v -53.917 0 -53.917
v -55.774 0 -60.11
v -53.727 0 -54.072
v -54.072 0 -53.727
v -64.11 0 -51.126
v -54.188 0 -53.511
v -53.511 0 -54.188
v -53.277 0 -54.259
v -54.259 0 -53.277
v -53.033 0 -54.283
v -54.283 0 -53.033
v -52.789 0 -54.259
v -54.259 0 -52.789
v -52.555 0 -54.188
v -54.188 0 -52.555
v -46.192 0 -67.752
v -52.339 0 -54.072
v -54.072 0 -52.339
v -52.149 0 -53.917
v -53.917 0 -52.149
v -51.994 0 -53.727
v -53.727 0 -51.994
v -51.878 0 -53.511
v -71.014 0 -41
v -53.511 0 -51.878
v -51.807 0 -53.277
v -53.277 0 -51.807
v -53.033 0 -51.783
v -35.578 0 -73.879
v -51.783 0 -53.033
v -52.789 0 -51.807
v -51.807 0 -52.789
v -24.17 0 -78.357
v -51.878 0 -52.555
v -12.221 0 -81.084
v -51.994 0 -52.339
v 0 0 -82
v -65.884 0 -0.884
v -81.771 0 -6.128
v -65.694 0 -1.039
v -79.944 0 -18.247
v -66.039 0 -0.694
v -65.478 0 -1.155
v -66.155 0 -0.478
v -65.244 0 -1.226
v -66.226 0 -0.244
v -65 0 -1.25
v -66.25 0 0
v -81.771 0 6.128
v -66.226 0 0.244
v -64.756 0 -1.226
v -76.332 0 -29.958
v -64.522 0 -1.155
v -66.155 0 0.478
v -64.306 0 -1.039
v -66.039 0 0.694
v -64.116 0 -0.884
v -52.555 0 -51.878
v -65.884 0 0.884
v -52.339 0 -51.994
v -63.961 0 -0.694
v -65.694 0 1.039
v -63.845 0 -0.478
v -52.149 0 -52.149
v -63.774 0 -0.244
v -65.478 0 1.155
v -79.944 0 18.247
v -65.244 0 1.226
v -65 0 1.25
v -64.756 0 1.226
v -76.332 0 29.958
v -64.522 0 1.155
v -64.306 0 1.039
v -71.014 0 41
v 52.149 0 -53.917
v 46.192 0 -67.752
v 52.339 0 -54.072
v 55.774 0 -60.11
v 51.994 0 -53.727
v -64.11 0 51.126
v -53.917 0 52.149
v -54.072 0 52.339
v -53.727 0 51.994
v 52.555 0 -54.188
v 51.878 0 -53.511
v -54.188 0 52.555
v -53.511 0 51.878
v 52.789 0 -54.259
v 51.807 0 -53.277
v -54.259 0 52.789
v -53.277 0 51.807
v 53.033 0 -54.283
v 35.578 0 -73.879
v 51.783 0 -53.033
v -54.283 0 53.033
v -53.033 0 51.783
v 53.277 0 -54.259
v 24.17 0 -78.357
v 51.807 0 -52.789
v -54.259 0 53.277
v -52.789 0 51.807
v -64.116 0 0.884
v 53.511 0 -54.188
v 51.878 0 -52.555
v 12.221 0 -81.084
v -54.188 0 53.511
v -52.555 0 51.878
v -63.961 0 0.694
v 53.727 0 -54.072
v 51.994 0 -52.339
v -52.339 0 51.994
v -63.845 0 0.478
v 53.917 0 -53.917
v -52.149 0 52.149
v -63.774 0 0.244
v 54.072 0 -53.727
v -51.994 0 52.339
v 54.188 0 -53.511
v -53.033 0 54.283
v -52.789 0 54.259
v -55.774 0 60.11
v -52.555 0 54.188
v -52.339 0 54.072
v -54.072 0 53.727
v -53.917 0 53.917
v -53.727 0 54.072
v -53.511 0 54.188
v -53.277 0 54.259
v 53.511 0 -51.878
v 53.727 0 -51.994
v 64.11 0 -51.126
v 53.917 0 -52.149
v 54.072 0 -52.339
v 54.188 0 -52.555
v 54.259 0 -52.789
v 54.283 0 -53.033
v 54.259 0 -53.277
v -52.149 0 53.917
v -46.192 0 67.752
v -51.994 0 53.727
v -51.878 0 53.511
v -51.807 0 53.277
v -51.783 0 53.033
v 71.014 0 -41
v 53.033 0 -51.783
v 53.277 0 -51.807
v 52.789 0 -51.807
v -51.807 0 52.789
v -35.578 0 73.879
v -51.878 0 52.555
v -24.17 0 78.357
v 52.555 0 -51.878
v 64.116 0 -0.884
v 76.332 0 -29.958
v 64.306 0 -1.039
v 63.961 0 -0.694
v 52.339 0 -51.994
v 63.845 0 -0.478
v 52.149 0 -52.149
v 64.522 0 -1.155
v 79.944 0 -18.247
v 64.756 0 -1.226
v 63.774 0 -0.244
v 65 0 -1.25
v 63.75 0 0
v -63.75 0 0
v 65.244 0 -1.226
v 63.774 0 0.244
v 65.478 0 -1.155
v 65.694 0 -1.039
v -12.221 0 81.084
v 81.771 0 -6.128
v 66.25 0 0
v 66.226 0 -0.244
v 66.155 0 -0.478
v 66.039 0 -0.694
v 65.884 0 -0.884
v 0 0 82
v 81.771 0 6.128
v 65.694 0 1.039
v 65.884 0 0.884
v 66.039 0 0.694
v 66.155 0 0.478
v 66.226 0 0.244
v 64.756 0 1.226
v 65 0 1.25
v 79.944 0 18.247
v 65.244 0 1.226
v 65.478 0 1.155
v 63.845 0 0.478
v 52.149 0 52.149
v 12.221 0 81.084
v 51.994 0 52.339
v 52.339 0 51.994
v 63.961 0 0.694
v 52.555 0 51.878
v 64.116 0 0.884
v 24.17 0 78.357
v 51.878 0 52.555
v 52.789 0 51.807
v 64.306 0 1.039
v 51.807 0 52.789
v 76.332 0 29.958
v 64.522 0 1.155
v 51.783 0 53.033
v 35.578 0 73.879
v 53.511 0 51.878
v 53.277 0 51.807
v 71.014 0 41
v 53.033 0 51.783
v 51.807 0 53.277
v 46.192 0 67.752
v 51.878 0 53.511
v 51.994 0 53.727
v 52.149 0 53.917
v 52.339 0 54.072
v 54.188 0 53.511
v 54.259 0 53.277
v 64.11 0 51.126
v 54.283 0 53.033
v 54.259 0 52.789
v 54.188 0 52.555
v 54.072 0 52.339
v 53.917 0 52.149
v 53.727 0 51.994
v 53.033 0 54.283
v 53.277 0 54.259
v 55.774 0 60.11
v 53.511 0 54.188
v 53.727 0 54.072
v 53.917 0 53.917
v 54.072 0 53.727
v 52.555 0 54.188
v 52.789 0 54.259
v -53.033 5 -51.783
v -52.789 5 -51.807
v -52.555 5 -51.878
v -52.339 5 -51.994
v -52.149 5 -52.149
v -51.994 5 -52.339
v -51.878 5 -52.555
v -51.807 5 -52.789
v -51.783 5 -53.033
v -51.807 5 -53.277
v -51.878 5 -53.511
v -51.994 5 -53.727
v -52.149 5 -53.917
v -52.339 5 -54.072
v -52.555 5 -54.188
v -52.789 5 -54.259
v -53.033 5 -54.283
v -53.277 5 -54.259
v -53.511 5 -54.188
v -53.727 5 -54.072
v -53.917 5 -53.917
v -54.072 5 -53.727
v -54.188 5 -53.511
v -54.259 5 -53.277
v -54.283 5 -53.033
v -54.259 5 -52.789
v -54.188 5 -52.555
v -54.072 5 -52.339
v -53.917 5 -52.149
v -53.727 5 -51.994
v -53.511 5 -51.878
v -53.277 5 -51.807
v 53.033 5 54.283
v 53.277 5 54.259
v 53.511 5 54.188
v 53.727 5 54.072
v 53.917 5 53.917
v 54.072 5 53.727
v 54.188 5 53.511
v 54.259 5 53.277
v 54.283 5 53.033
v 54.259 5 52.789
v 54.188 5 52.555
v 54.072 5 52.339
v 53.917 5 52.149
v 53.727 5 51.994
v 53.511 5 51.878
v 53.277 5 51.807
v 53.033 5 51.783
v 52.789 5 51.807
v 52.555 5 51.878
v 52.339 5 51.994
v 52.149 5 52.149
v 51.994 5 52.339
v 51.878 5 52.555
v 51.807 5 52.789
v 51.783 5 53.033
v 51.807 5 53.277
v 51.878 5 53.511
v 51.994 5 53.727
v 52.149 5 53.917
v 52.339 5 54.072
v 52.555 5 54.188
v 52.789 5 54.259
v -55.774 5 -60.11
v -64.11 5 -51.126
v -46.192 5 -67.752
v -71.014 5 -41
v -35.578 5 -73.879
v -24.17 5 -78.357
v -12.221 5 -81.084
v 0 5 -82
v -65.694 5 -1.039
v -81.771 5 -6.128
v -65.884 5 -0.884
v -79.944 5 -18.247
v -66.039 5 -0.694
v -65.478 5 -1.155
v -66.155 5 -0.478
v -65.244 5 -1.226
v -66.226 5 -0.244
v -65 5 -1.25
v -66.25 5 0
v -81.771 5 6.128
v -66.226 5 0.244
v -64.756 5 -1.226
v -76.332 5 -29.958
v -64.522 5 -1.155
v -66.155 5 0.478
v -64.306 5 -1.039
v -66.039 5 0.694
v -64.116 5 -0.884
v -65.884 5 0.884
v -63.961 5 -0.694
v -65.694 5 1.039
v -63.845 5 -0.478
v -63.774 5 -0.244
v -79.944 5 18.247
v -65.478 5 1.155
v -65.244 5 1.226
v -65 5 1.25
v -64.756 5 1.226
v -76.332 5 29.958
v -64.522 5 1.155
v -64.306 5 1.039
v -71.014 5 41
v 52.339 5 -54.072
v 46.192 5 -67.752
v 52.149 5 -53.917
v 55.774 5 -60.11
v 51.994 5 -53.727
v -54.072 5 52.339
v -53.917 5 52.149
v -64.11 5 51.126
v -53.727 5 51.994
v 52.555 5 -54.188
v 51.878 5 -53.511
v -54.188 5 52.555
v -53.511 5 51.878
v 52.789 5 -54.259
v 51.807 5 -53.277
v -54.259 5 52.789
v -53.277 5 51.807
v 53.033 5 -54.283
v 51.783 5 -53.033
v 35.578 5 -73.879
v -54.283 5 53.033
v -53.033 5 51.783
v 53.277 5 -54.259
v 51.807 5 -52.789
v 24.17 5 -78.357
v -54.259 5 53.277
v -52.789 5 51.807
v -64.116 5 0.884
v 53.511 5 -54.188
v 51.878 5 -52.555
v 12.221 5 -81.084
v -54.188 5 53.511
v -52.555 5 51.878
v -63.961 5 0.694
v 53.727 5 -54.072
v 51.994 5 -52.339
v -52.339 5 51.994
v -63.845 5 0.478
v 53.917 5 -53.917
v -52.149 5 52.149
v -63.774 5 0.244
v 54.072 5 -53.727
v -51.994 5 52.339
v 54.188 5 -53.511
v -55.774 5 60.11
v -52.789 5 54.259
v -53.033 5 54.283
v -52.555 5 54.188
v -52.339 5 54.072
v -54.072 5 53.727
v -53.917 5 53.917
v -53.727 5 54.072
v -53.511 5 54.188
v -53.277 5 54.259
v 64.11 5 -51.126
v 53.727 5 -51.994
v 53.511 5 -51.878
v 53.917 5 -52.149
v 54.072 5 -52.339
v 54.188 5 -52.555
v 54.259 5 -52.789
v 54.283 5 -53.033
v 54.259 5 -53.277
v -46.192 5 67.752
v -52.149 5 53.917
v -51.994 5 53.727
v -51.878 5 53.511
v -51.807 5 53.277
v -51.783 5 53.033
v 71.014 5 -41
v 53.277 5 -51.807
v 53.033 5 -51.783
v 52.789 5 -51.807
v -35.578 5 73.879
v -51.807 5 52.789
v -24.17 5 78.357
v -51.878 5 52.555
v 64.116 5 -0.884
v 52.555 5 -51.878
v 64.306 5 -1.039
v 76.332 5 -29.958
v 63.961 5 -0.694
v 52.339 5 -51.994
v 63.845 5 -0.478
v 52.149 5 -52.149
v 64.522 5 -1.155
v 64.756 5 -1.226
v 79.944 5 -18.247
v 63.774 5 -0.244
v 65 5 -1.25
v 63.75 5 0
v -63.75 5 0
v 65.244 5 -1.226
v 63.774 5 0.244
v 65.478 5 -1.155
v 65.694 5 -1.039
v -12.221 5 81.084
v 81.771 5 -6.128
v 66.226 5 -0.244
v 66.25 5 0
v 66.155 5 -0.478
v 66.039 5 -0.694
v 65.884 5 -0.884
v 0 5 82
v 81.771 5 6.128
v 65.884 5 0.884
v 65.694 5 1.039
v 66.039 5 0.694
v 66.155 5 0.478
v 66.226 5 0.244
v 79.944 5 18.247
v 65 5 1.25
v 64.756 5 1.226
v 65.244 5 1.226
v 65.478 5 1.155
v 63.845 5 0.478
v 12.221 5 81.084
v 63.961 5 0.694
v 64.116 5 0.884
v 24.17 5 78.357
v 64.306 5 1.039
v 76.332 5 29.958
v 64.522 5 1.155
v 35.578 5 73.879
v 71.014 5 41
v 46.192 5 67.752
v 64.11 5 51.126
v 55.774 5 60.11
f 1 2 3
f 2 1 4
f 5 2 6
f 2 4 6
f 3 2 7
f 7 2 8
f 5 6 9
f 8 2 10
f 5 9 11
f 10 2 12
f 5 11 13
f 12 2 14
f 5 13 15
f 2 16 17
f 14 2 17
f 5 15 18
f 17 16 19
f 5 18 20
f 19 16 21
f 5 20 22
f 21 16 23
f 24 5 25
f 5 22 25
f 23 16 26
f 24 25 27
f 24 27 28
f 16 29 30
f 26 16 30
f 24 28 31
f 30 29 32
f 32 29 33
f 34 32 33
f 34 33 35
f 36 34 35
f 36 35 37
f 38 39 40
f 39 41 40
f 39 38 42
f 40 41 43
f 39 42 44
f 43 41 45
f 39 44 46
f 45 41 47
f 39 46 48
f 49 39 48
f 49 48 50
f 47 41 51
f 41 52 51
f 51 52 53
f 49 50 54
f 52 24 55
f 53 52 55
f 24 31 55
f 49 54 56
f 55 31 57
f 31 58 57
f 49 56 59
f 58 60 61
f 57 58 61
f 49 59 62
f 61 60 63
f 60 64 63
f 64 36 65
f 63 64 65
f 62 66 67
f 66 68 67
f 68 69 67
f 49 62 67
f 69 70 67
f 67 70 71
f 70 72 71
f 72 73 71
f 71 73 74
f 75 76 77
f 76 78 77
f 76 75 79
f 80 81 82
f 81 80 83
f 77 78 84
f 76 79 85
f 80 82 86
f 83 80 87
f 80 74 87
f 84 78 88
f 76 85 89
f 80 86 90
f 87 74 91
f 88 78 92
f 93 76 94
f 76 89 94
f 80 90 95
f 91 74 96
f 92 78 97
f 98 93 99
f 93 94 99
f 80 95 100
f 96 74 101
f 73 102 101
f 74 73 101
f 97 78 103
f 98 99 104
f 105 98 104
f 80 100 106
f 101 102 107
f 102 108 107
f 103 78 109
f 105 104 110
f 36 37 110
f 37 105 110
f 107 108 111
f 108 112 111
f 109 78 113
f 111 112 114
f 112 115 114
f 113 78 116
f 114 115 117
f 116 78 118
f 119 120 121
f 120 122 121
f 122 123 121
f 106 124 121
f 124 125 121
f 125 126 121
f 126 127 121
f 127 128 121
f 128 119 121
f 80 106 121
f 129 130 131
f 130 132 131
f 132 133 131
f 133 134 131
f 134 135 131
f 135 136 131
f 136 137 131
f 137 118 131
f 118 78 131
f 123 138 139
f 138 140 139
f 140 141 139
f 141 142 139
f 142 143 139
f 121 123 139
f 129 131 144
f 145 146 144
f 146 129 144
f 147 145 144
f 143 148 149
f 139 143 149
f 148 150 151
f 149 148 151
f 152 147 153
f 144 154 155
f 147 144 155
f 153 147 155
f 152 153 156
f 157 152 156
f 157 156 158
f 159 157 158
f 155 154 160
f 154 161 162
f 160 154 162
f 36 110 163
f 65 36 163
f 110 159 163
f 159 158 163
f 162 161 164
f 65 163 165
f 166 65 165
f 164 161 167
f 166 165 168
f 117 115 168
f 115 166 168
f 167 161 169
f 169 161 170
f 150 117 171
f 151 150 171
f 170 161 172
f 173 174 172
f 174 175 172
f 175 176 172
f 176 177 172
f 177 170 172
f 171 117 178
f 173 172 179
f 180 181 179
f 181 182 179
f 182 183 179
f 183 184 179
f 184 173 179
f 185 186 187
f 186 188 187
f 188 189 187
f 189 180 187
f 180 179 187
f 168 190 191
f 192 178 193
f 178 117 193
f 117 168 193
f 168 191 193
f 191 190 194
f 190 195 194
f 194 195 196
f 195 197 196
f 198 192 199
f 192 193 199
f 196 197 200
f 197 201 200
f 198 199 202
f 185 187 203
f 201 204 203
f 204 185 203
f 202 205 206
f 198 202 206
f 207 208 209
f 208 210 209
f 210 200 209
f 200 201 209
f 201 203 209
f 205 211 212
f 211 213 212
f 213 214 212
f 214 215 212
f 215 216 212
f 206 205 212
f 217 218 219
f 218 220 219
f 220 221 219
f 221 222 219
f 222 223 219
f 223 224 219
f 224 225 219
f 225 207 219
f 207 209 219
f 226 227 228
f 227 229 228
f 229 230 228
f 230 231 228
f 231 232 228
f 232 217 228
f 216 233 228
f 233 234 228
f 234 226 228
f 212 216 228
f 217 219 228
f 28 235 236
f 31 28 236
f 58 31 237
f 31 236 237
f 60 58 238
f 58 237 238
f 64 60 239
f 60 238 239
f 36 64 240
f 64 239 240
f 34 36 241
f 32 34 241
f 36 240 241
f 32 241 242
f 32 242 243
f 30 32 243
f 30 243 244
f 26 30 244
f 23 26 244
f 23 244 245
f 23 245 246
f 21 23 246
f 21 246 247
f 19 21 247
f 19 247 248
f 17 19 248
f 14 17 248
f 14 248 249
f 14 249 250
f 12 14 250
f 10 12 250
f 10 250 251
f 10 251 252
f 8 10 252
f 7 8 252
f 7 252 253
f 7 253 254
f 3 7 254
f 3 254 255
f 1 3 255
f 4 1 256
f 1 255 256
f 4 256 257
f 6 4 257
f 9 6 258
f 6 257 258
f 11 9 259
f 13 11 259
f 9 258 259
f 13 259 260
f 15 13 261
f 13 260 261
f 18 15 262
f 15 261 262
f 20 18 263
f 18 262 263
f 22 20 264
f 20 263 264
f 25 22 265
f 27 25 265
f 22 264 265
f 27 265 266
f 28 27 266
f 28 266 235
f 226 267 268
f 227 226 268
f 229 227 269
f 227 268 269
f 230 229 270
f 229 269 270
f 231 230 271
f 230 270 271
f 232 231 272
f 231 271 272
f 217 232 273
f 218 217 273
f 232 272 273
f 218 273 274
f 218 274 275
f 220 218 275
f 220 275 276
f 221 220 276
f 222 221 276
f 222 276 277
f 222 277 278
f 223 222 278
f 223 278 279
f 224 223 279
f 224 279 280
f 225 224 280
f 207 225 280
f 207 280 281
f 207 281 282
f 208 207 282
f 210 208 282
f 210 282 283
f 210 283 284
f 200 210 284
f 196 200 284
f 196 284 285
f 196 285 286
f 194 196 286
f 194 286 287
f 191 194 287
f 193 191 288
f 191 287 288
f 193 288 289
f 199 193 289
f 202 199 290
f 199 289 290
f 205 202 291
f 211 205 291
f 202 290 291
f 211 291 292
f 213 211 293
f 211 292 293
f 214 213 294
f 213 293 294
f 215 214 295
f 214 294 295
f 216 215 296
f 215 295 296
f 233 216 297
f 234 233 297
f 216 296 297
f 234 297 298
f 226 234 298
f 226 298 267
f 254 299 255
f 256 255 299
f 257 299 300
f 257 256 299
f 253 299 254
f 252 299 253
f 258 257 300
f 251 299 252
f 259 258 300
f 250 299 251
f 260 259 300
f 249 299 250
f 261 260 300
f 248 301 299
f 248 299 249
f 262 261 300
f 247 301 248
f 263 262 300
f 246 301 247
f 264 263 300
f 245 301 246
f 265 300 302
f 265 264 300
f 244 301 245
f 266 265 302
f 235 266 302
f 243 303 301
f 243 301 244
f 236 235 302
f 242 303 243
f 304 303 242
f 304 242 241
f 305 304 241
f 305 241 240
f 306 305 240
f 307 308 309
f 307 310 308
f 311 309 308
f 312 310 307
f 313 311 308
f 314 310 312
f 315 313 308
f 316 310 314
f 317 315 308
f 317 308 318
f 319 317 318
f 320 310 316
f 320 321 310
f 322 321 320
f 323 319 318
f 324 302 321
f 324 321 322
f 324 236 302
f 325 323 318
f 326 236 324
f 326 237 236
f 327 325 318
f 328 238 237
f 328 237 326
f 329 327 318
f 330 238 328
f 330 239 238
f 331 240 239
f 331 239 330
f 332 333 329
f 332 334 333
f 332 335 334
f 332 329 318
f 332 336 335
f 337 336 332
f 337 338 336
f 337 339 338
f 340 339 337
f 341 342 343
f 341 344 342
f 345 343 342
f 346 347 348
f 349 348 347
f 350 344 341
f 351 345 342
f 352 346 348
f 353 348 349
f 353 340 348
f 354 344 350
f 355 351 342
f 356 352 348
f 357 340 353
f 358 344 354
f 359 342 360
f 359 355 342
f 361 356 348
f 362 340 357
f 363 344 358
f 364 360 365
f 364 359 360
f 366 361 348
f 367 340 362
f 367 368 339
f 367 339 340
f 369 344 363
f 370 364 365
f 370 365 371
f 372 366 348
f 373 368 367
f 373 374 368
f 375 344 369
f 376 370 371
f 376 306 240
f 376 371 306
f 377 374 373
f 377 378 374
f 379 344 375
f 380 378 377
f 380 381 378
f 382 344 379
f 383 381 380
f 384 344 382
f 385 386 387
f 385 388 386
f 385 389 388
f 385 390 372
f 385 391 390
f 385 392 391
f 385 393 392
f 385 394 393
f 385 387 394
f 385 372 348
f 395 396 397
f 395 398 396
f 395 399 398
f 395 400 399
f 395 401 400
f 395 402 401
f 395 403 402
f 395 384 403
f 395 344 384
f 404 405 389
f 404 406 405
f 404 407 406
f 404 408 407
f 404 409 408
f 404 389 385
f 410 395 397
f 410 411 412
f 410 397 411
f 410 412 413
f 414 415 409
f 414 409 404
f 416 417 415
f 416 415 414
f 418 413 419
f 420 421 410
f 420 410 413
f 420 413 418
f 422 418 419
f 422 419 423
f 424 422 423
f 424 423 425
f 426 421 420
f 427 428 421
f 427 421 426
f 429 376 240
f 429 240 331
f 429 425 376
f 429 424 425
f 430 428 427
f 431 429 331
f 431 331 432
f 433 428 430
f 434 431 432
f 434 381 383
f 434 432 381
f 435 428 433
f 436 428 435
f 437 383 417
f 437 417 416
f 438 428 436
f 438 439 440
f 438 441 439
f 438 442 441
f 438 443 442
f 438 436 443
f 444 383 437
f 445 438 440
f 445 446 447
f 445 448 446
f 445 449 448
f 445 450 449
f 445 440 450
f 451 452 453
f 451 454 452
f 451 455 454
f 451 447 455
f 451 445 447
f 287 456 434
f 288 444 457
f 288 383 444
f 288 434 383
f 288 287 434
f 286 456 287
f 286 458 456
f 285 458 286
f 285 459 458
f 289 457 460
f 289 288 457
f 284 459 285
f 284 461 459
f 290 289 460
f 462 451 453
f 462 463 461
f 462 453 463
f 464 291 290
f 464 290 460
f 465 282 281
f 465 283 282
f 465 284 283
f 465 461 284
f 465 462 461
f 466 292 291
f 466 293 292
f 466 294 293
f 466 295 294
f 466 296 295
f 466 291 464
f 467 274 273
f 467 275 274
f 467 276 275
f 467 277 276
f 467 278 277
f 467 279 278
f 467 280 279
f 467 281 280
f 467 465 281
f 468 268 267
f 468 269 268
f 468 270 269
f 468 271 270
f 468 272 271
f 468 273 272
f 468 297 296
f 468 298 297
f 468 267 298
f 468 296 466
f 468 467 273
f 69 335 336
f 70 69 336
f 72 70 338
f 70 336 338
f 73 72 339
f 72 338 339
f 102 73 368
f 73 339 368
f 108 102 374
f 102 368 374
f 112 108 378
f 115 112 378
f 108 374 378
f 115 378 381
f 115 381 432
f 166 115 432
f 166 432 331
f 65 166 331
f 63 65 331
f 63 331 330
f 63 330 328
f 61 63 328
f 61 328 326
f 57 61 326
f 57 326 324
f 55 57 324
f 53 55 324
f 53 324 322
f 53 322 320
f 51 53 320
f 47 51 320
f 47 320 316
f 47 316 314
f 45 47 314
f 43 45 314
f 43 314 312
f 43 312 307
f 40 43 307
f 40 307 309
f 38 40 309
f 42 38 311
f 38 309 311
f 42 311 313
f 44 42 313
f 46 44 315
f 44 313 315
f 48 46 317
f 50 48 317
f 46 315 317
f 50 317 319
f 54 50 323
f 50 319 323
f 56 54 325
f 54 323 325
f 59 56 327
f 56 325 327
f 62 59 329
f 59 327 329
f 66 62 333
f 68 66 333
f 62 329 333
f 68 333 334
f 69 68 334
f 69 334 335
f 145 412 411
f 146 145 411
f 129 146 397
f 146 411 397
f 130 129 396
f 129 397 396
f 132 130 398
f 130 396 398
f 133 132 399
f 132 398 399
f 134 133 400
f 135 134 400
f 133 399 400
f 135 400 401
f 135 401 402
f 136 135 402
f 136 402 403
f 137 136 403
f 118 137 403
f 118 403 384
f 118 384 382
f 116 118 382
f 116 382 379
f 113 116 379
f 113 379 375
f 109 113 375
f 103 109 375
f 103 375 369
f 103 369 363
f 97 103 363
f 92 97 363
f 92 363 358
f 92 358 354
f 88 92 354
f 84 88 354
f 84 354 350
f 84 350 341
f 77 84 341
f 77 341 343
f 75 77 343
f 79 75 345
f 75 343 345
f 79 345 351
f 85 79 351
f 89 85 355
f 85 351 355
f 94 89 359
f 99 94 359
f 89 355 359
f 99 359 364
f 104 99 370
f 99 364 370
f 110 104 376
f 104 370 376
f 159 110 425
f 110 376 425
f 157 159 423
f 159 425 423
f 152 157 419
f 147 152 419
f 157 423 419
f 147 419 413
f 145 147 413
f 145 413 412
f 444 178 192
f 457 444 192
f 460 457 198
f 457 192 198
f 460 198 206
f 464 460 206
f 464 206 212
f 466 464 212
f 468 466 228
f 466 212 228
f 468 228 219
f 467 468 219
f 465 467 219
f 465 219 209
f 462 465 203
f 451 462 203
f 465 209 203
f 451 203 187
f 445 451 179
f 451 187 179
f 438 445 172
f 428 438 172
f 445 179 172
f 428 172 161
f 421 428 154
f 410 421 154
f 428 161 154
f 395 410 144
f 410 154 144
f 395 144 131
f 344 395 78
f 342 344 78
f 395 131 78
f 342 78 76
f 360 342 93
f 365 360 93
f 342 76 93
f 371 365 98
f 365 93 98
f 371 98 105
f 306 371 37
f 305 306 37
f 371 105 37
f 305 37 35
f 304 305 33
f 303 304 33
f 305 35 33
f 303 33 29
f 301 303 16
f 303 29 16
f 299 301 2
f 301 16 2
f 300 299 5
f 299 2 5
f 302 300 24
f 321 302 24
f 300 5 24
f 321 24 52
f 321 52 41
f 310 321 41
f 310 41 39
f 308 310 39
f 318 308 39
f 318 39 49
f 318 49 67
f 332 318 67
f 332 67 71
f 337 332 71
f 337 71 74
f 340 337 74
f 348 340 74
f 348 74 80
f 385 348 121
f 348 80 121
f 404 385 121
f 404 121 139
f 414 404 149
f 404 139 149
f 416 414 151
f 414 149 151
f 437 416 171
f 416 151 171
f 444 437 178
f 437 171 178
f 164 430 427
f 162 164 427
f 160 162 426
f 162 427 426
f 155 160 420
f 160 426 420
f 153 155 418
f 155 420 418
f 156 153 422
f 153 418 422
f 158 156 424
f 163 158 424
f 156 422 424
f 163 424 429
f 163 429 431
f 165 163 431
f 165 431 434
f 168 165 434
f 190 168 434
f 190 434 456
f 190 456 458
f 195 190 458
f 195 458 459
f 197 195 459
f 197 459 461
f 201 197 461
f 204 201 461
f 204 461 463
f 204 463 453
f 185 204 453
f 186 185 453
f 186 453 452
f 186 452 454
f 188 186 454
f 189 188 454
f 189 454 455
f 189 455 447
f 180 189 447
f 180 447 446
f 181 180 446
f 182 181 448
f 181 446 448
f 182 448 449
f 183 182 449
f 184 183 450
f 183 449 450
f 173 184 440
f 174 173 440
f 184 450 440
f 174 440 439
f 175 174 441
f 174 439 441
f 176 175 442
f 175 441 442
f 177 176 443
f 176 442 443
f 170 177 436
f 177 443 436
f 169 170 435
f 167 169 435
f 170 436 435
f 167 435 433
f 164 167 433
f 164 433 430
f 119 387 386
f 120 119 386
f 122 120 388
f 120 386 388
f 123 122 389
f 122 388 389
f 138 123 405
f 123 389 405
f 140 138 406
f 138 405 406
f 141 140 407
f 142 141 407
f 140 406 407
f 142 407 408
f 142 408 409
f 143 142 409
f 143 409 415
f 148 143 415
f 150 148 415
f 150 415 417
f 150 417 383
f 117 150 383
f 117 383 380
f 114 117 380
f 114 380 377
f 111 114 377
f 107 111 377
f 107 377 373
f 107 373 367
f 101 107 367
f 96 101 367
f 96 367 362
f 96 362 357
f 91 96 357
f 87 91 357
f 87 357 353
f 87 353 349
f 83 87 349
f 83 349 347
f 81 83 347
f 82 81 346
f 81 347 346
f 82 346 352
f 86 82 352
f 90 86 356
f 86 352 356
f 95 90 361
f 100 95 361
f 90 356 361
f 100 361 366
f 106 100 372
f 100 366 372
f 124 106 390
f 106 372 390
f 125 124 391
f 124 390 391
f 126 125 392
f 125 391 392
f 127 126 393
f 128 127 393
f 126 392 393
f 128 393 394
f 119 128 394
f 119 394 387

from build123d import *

# Parameters (mm, degrees)
SKETCH1_R           = 82
BOSS_EXTRUDE1_DEPTH = 5
SKETCH14_R          = 1.25
CUT_EXTRUDE2_DEPTH  = 133
SKETCH15_R          = 1.25
CUT_EXTRUDE3_DEPTH  = 10
CIRPATTERN1_COUNT   = 2


with BuildPart() as part:
    # Sketch1 → Boss-Extrude1 (new body)
    with BuildSketch(Plane(origin=(0, 0, 0), x_dir=(1, 0, 0), z_dir=(0, 1, 0))):
        with Locations(Location((0, 0, 0), (0, 0, 270))):
            Circle(SKETCH1_R)
    extrude(amount=BOSS_EXTRUDE1_DEPTH)

    # Sketch14 → Cut-Extrude2 (cut)
    with BuildSketch(Plane(origin=(0, 5, 0), x_dir=(1, 0, 0), z_dir=(0, 1, 0))):
        with Locations(Location((-53.033008589, 53.033008589, 0), (0, 0, 270))):
            Circle(SKETCH14_R)
        with Locations(Location((53.033008589, 53.033008589, 0), (0, 0, 270))):
            Circle(SKETCH14_R)
        with Locations(Location((53.033008589, -53.033008589, 0), (0, 0, 270))):
            Circle(SKETCH14_R)
        with Locations(Location((-53.033008589, -53.033008589, 0), (0, 0, 270))):
            Circle(SKETCH14_R)
    extrude(amount=-CUT_EXTRUDE2_DEPTH, mode=Mode.SUBTRACT)

    # Sketch15 → Cut-Extrude3 (cut)
    with BuildSketch(Plane(origin=(0, 5, 0), x_dir=(1, 0, 0), z_dir=(0, 1, 0))):
        with Locations(Location((-65, 0, 0), (0, 0, 270))):
            Circle(SKETCH15_R)
    cut_extrude3 = extrude(amount=-CUT_EXTRUDE3_DEPTH, mode=Mode.SUBTRACT)

    # CirPattern1: Cut-Extrude3 ×2 about axis
    cirpattern1_axis = Axis((0, 0, 0), (0, 1, 0))
    for i in range(1, CIRPATTERN1_COUNT):
        add(cut_extrude3.rotate(cirpattern1_axis, i * 360 / CIRPATTERN1_COUNT), mode=Mode.SUBTRACT)


solid = part.part
